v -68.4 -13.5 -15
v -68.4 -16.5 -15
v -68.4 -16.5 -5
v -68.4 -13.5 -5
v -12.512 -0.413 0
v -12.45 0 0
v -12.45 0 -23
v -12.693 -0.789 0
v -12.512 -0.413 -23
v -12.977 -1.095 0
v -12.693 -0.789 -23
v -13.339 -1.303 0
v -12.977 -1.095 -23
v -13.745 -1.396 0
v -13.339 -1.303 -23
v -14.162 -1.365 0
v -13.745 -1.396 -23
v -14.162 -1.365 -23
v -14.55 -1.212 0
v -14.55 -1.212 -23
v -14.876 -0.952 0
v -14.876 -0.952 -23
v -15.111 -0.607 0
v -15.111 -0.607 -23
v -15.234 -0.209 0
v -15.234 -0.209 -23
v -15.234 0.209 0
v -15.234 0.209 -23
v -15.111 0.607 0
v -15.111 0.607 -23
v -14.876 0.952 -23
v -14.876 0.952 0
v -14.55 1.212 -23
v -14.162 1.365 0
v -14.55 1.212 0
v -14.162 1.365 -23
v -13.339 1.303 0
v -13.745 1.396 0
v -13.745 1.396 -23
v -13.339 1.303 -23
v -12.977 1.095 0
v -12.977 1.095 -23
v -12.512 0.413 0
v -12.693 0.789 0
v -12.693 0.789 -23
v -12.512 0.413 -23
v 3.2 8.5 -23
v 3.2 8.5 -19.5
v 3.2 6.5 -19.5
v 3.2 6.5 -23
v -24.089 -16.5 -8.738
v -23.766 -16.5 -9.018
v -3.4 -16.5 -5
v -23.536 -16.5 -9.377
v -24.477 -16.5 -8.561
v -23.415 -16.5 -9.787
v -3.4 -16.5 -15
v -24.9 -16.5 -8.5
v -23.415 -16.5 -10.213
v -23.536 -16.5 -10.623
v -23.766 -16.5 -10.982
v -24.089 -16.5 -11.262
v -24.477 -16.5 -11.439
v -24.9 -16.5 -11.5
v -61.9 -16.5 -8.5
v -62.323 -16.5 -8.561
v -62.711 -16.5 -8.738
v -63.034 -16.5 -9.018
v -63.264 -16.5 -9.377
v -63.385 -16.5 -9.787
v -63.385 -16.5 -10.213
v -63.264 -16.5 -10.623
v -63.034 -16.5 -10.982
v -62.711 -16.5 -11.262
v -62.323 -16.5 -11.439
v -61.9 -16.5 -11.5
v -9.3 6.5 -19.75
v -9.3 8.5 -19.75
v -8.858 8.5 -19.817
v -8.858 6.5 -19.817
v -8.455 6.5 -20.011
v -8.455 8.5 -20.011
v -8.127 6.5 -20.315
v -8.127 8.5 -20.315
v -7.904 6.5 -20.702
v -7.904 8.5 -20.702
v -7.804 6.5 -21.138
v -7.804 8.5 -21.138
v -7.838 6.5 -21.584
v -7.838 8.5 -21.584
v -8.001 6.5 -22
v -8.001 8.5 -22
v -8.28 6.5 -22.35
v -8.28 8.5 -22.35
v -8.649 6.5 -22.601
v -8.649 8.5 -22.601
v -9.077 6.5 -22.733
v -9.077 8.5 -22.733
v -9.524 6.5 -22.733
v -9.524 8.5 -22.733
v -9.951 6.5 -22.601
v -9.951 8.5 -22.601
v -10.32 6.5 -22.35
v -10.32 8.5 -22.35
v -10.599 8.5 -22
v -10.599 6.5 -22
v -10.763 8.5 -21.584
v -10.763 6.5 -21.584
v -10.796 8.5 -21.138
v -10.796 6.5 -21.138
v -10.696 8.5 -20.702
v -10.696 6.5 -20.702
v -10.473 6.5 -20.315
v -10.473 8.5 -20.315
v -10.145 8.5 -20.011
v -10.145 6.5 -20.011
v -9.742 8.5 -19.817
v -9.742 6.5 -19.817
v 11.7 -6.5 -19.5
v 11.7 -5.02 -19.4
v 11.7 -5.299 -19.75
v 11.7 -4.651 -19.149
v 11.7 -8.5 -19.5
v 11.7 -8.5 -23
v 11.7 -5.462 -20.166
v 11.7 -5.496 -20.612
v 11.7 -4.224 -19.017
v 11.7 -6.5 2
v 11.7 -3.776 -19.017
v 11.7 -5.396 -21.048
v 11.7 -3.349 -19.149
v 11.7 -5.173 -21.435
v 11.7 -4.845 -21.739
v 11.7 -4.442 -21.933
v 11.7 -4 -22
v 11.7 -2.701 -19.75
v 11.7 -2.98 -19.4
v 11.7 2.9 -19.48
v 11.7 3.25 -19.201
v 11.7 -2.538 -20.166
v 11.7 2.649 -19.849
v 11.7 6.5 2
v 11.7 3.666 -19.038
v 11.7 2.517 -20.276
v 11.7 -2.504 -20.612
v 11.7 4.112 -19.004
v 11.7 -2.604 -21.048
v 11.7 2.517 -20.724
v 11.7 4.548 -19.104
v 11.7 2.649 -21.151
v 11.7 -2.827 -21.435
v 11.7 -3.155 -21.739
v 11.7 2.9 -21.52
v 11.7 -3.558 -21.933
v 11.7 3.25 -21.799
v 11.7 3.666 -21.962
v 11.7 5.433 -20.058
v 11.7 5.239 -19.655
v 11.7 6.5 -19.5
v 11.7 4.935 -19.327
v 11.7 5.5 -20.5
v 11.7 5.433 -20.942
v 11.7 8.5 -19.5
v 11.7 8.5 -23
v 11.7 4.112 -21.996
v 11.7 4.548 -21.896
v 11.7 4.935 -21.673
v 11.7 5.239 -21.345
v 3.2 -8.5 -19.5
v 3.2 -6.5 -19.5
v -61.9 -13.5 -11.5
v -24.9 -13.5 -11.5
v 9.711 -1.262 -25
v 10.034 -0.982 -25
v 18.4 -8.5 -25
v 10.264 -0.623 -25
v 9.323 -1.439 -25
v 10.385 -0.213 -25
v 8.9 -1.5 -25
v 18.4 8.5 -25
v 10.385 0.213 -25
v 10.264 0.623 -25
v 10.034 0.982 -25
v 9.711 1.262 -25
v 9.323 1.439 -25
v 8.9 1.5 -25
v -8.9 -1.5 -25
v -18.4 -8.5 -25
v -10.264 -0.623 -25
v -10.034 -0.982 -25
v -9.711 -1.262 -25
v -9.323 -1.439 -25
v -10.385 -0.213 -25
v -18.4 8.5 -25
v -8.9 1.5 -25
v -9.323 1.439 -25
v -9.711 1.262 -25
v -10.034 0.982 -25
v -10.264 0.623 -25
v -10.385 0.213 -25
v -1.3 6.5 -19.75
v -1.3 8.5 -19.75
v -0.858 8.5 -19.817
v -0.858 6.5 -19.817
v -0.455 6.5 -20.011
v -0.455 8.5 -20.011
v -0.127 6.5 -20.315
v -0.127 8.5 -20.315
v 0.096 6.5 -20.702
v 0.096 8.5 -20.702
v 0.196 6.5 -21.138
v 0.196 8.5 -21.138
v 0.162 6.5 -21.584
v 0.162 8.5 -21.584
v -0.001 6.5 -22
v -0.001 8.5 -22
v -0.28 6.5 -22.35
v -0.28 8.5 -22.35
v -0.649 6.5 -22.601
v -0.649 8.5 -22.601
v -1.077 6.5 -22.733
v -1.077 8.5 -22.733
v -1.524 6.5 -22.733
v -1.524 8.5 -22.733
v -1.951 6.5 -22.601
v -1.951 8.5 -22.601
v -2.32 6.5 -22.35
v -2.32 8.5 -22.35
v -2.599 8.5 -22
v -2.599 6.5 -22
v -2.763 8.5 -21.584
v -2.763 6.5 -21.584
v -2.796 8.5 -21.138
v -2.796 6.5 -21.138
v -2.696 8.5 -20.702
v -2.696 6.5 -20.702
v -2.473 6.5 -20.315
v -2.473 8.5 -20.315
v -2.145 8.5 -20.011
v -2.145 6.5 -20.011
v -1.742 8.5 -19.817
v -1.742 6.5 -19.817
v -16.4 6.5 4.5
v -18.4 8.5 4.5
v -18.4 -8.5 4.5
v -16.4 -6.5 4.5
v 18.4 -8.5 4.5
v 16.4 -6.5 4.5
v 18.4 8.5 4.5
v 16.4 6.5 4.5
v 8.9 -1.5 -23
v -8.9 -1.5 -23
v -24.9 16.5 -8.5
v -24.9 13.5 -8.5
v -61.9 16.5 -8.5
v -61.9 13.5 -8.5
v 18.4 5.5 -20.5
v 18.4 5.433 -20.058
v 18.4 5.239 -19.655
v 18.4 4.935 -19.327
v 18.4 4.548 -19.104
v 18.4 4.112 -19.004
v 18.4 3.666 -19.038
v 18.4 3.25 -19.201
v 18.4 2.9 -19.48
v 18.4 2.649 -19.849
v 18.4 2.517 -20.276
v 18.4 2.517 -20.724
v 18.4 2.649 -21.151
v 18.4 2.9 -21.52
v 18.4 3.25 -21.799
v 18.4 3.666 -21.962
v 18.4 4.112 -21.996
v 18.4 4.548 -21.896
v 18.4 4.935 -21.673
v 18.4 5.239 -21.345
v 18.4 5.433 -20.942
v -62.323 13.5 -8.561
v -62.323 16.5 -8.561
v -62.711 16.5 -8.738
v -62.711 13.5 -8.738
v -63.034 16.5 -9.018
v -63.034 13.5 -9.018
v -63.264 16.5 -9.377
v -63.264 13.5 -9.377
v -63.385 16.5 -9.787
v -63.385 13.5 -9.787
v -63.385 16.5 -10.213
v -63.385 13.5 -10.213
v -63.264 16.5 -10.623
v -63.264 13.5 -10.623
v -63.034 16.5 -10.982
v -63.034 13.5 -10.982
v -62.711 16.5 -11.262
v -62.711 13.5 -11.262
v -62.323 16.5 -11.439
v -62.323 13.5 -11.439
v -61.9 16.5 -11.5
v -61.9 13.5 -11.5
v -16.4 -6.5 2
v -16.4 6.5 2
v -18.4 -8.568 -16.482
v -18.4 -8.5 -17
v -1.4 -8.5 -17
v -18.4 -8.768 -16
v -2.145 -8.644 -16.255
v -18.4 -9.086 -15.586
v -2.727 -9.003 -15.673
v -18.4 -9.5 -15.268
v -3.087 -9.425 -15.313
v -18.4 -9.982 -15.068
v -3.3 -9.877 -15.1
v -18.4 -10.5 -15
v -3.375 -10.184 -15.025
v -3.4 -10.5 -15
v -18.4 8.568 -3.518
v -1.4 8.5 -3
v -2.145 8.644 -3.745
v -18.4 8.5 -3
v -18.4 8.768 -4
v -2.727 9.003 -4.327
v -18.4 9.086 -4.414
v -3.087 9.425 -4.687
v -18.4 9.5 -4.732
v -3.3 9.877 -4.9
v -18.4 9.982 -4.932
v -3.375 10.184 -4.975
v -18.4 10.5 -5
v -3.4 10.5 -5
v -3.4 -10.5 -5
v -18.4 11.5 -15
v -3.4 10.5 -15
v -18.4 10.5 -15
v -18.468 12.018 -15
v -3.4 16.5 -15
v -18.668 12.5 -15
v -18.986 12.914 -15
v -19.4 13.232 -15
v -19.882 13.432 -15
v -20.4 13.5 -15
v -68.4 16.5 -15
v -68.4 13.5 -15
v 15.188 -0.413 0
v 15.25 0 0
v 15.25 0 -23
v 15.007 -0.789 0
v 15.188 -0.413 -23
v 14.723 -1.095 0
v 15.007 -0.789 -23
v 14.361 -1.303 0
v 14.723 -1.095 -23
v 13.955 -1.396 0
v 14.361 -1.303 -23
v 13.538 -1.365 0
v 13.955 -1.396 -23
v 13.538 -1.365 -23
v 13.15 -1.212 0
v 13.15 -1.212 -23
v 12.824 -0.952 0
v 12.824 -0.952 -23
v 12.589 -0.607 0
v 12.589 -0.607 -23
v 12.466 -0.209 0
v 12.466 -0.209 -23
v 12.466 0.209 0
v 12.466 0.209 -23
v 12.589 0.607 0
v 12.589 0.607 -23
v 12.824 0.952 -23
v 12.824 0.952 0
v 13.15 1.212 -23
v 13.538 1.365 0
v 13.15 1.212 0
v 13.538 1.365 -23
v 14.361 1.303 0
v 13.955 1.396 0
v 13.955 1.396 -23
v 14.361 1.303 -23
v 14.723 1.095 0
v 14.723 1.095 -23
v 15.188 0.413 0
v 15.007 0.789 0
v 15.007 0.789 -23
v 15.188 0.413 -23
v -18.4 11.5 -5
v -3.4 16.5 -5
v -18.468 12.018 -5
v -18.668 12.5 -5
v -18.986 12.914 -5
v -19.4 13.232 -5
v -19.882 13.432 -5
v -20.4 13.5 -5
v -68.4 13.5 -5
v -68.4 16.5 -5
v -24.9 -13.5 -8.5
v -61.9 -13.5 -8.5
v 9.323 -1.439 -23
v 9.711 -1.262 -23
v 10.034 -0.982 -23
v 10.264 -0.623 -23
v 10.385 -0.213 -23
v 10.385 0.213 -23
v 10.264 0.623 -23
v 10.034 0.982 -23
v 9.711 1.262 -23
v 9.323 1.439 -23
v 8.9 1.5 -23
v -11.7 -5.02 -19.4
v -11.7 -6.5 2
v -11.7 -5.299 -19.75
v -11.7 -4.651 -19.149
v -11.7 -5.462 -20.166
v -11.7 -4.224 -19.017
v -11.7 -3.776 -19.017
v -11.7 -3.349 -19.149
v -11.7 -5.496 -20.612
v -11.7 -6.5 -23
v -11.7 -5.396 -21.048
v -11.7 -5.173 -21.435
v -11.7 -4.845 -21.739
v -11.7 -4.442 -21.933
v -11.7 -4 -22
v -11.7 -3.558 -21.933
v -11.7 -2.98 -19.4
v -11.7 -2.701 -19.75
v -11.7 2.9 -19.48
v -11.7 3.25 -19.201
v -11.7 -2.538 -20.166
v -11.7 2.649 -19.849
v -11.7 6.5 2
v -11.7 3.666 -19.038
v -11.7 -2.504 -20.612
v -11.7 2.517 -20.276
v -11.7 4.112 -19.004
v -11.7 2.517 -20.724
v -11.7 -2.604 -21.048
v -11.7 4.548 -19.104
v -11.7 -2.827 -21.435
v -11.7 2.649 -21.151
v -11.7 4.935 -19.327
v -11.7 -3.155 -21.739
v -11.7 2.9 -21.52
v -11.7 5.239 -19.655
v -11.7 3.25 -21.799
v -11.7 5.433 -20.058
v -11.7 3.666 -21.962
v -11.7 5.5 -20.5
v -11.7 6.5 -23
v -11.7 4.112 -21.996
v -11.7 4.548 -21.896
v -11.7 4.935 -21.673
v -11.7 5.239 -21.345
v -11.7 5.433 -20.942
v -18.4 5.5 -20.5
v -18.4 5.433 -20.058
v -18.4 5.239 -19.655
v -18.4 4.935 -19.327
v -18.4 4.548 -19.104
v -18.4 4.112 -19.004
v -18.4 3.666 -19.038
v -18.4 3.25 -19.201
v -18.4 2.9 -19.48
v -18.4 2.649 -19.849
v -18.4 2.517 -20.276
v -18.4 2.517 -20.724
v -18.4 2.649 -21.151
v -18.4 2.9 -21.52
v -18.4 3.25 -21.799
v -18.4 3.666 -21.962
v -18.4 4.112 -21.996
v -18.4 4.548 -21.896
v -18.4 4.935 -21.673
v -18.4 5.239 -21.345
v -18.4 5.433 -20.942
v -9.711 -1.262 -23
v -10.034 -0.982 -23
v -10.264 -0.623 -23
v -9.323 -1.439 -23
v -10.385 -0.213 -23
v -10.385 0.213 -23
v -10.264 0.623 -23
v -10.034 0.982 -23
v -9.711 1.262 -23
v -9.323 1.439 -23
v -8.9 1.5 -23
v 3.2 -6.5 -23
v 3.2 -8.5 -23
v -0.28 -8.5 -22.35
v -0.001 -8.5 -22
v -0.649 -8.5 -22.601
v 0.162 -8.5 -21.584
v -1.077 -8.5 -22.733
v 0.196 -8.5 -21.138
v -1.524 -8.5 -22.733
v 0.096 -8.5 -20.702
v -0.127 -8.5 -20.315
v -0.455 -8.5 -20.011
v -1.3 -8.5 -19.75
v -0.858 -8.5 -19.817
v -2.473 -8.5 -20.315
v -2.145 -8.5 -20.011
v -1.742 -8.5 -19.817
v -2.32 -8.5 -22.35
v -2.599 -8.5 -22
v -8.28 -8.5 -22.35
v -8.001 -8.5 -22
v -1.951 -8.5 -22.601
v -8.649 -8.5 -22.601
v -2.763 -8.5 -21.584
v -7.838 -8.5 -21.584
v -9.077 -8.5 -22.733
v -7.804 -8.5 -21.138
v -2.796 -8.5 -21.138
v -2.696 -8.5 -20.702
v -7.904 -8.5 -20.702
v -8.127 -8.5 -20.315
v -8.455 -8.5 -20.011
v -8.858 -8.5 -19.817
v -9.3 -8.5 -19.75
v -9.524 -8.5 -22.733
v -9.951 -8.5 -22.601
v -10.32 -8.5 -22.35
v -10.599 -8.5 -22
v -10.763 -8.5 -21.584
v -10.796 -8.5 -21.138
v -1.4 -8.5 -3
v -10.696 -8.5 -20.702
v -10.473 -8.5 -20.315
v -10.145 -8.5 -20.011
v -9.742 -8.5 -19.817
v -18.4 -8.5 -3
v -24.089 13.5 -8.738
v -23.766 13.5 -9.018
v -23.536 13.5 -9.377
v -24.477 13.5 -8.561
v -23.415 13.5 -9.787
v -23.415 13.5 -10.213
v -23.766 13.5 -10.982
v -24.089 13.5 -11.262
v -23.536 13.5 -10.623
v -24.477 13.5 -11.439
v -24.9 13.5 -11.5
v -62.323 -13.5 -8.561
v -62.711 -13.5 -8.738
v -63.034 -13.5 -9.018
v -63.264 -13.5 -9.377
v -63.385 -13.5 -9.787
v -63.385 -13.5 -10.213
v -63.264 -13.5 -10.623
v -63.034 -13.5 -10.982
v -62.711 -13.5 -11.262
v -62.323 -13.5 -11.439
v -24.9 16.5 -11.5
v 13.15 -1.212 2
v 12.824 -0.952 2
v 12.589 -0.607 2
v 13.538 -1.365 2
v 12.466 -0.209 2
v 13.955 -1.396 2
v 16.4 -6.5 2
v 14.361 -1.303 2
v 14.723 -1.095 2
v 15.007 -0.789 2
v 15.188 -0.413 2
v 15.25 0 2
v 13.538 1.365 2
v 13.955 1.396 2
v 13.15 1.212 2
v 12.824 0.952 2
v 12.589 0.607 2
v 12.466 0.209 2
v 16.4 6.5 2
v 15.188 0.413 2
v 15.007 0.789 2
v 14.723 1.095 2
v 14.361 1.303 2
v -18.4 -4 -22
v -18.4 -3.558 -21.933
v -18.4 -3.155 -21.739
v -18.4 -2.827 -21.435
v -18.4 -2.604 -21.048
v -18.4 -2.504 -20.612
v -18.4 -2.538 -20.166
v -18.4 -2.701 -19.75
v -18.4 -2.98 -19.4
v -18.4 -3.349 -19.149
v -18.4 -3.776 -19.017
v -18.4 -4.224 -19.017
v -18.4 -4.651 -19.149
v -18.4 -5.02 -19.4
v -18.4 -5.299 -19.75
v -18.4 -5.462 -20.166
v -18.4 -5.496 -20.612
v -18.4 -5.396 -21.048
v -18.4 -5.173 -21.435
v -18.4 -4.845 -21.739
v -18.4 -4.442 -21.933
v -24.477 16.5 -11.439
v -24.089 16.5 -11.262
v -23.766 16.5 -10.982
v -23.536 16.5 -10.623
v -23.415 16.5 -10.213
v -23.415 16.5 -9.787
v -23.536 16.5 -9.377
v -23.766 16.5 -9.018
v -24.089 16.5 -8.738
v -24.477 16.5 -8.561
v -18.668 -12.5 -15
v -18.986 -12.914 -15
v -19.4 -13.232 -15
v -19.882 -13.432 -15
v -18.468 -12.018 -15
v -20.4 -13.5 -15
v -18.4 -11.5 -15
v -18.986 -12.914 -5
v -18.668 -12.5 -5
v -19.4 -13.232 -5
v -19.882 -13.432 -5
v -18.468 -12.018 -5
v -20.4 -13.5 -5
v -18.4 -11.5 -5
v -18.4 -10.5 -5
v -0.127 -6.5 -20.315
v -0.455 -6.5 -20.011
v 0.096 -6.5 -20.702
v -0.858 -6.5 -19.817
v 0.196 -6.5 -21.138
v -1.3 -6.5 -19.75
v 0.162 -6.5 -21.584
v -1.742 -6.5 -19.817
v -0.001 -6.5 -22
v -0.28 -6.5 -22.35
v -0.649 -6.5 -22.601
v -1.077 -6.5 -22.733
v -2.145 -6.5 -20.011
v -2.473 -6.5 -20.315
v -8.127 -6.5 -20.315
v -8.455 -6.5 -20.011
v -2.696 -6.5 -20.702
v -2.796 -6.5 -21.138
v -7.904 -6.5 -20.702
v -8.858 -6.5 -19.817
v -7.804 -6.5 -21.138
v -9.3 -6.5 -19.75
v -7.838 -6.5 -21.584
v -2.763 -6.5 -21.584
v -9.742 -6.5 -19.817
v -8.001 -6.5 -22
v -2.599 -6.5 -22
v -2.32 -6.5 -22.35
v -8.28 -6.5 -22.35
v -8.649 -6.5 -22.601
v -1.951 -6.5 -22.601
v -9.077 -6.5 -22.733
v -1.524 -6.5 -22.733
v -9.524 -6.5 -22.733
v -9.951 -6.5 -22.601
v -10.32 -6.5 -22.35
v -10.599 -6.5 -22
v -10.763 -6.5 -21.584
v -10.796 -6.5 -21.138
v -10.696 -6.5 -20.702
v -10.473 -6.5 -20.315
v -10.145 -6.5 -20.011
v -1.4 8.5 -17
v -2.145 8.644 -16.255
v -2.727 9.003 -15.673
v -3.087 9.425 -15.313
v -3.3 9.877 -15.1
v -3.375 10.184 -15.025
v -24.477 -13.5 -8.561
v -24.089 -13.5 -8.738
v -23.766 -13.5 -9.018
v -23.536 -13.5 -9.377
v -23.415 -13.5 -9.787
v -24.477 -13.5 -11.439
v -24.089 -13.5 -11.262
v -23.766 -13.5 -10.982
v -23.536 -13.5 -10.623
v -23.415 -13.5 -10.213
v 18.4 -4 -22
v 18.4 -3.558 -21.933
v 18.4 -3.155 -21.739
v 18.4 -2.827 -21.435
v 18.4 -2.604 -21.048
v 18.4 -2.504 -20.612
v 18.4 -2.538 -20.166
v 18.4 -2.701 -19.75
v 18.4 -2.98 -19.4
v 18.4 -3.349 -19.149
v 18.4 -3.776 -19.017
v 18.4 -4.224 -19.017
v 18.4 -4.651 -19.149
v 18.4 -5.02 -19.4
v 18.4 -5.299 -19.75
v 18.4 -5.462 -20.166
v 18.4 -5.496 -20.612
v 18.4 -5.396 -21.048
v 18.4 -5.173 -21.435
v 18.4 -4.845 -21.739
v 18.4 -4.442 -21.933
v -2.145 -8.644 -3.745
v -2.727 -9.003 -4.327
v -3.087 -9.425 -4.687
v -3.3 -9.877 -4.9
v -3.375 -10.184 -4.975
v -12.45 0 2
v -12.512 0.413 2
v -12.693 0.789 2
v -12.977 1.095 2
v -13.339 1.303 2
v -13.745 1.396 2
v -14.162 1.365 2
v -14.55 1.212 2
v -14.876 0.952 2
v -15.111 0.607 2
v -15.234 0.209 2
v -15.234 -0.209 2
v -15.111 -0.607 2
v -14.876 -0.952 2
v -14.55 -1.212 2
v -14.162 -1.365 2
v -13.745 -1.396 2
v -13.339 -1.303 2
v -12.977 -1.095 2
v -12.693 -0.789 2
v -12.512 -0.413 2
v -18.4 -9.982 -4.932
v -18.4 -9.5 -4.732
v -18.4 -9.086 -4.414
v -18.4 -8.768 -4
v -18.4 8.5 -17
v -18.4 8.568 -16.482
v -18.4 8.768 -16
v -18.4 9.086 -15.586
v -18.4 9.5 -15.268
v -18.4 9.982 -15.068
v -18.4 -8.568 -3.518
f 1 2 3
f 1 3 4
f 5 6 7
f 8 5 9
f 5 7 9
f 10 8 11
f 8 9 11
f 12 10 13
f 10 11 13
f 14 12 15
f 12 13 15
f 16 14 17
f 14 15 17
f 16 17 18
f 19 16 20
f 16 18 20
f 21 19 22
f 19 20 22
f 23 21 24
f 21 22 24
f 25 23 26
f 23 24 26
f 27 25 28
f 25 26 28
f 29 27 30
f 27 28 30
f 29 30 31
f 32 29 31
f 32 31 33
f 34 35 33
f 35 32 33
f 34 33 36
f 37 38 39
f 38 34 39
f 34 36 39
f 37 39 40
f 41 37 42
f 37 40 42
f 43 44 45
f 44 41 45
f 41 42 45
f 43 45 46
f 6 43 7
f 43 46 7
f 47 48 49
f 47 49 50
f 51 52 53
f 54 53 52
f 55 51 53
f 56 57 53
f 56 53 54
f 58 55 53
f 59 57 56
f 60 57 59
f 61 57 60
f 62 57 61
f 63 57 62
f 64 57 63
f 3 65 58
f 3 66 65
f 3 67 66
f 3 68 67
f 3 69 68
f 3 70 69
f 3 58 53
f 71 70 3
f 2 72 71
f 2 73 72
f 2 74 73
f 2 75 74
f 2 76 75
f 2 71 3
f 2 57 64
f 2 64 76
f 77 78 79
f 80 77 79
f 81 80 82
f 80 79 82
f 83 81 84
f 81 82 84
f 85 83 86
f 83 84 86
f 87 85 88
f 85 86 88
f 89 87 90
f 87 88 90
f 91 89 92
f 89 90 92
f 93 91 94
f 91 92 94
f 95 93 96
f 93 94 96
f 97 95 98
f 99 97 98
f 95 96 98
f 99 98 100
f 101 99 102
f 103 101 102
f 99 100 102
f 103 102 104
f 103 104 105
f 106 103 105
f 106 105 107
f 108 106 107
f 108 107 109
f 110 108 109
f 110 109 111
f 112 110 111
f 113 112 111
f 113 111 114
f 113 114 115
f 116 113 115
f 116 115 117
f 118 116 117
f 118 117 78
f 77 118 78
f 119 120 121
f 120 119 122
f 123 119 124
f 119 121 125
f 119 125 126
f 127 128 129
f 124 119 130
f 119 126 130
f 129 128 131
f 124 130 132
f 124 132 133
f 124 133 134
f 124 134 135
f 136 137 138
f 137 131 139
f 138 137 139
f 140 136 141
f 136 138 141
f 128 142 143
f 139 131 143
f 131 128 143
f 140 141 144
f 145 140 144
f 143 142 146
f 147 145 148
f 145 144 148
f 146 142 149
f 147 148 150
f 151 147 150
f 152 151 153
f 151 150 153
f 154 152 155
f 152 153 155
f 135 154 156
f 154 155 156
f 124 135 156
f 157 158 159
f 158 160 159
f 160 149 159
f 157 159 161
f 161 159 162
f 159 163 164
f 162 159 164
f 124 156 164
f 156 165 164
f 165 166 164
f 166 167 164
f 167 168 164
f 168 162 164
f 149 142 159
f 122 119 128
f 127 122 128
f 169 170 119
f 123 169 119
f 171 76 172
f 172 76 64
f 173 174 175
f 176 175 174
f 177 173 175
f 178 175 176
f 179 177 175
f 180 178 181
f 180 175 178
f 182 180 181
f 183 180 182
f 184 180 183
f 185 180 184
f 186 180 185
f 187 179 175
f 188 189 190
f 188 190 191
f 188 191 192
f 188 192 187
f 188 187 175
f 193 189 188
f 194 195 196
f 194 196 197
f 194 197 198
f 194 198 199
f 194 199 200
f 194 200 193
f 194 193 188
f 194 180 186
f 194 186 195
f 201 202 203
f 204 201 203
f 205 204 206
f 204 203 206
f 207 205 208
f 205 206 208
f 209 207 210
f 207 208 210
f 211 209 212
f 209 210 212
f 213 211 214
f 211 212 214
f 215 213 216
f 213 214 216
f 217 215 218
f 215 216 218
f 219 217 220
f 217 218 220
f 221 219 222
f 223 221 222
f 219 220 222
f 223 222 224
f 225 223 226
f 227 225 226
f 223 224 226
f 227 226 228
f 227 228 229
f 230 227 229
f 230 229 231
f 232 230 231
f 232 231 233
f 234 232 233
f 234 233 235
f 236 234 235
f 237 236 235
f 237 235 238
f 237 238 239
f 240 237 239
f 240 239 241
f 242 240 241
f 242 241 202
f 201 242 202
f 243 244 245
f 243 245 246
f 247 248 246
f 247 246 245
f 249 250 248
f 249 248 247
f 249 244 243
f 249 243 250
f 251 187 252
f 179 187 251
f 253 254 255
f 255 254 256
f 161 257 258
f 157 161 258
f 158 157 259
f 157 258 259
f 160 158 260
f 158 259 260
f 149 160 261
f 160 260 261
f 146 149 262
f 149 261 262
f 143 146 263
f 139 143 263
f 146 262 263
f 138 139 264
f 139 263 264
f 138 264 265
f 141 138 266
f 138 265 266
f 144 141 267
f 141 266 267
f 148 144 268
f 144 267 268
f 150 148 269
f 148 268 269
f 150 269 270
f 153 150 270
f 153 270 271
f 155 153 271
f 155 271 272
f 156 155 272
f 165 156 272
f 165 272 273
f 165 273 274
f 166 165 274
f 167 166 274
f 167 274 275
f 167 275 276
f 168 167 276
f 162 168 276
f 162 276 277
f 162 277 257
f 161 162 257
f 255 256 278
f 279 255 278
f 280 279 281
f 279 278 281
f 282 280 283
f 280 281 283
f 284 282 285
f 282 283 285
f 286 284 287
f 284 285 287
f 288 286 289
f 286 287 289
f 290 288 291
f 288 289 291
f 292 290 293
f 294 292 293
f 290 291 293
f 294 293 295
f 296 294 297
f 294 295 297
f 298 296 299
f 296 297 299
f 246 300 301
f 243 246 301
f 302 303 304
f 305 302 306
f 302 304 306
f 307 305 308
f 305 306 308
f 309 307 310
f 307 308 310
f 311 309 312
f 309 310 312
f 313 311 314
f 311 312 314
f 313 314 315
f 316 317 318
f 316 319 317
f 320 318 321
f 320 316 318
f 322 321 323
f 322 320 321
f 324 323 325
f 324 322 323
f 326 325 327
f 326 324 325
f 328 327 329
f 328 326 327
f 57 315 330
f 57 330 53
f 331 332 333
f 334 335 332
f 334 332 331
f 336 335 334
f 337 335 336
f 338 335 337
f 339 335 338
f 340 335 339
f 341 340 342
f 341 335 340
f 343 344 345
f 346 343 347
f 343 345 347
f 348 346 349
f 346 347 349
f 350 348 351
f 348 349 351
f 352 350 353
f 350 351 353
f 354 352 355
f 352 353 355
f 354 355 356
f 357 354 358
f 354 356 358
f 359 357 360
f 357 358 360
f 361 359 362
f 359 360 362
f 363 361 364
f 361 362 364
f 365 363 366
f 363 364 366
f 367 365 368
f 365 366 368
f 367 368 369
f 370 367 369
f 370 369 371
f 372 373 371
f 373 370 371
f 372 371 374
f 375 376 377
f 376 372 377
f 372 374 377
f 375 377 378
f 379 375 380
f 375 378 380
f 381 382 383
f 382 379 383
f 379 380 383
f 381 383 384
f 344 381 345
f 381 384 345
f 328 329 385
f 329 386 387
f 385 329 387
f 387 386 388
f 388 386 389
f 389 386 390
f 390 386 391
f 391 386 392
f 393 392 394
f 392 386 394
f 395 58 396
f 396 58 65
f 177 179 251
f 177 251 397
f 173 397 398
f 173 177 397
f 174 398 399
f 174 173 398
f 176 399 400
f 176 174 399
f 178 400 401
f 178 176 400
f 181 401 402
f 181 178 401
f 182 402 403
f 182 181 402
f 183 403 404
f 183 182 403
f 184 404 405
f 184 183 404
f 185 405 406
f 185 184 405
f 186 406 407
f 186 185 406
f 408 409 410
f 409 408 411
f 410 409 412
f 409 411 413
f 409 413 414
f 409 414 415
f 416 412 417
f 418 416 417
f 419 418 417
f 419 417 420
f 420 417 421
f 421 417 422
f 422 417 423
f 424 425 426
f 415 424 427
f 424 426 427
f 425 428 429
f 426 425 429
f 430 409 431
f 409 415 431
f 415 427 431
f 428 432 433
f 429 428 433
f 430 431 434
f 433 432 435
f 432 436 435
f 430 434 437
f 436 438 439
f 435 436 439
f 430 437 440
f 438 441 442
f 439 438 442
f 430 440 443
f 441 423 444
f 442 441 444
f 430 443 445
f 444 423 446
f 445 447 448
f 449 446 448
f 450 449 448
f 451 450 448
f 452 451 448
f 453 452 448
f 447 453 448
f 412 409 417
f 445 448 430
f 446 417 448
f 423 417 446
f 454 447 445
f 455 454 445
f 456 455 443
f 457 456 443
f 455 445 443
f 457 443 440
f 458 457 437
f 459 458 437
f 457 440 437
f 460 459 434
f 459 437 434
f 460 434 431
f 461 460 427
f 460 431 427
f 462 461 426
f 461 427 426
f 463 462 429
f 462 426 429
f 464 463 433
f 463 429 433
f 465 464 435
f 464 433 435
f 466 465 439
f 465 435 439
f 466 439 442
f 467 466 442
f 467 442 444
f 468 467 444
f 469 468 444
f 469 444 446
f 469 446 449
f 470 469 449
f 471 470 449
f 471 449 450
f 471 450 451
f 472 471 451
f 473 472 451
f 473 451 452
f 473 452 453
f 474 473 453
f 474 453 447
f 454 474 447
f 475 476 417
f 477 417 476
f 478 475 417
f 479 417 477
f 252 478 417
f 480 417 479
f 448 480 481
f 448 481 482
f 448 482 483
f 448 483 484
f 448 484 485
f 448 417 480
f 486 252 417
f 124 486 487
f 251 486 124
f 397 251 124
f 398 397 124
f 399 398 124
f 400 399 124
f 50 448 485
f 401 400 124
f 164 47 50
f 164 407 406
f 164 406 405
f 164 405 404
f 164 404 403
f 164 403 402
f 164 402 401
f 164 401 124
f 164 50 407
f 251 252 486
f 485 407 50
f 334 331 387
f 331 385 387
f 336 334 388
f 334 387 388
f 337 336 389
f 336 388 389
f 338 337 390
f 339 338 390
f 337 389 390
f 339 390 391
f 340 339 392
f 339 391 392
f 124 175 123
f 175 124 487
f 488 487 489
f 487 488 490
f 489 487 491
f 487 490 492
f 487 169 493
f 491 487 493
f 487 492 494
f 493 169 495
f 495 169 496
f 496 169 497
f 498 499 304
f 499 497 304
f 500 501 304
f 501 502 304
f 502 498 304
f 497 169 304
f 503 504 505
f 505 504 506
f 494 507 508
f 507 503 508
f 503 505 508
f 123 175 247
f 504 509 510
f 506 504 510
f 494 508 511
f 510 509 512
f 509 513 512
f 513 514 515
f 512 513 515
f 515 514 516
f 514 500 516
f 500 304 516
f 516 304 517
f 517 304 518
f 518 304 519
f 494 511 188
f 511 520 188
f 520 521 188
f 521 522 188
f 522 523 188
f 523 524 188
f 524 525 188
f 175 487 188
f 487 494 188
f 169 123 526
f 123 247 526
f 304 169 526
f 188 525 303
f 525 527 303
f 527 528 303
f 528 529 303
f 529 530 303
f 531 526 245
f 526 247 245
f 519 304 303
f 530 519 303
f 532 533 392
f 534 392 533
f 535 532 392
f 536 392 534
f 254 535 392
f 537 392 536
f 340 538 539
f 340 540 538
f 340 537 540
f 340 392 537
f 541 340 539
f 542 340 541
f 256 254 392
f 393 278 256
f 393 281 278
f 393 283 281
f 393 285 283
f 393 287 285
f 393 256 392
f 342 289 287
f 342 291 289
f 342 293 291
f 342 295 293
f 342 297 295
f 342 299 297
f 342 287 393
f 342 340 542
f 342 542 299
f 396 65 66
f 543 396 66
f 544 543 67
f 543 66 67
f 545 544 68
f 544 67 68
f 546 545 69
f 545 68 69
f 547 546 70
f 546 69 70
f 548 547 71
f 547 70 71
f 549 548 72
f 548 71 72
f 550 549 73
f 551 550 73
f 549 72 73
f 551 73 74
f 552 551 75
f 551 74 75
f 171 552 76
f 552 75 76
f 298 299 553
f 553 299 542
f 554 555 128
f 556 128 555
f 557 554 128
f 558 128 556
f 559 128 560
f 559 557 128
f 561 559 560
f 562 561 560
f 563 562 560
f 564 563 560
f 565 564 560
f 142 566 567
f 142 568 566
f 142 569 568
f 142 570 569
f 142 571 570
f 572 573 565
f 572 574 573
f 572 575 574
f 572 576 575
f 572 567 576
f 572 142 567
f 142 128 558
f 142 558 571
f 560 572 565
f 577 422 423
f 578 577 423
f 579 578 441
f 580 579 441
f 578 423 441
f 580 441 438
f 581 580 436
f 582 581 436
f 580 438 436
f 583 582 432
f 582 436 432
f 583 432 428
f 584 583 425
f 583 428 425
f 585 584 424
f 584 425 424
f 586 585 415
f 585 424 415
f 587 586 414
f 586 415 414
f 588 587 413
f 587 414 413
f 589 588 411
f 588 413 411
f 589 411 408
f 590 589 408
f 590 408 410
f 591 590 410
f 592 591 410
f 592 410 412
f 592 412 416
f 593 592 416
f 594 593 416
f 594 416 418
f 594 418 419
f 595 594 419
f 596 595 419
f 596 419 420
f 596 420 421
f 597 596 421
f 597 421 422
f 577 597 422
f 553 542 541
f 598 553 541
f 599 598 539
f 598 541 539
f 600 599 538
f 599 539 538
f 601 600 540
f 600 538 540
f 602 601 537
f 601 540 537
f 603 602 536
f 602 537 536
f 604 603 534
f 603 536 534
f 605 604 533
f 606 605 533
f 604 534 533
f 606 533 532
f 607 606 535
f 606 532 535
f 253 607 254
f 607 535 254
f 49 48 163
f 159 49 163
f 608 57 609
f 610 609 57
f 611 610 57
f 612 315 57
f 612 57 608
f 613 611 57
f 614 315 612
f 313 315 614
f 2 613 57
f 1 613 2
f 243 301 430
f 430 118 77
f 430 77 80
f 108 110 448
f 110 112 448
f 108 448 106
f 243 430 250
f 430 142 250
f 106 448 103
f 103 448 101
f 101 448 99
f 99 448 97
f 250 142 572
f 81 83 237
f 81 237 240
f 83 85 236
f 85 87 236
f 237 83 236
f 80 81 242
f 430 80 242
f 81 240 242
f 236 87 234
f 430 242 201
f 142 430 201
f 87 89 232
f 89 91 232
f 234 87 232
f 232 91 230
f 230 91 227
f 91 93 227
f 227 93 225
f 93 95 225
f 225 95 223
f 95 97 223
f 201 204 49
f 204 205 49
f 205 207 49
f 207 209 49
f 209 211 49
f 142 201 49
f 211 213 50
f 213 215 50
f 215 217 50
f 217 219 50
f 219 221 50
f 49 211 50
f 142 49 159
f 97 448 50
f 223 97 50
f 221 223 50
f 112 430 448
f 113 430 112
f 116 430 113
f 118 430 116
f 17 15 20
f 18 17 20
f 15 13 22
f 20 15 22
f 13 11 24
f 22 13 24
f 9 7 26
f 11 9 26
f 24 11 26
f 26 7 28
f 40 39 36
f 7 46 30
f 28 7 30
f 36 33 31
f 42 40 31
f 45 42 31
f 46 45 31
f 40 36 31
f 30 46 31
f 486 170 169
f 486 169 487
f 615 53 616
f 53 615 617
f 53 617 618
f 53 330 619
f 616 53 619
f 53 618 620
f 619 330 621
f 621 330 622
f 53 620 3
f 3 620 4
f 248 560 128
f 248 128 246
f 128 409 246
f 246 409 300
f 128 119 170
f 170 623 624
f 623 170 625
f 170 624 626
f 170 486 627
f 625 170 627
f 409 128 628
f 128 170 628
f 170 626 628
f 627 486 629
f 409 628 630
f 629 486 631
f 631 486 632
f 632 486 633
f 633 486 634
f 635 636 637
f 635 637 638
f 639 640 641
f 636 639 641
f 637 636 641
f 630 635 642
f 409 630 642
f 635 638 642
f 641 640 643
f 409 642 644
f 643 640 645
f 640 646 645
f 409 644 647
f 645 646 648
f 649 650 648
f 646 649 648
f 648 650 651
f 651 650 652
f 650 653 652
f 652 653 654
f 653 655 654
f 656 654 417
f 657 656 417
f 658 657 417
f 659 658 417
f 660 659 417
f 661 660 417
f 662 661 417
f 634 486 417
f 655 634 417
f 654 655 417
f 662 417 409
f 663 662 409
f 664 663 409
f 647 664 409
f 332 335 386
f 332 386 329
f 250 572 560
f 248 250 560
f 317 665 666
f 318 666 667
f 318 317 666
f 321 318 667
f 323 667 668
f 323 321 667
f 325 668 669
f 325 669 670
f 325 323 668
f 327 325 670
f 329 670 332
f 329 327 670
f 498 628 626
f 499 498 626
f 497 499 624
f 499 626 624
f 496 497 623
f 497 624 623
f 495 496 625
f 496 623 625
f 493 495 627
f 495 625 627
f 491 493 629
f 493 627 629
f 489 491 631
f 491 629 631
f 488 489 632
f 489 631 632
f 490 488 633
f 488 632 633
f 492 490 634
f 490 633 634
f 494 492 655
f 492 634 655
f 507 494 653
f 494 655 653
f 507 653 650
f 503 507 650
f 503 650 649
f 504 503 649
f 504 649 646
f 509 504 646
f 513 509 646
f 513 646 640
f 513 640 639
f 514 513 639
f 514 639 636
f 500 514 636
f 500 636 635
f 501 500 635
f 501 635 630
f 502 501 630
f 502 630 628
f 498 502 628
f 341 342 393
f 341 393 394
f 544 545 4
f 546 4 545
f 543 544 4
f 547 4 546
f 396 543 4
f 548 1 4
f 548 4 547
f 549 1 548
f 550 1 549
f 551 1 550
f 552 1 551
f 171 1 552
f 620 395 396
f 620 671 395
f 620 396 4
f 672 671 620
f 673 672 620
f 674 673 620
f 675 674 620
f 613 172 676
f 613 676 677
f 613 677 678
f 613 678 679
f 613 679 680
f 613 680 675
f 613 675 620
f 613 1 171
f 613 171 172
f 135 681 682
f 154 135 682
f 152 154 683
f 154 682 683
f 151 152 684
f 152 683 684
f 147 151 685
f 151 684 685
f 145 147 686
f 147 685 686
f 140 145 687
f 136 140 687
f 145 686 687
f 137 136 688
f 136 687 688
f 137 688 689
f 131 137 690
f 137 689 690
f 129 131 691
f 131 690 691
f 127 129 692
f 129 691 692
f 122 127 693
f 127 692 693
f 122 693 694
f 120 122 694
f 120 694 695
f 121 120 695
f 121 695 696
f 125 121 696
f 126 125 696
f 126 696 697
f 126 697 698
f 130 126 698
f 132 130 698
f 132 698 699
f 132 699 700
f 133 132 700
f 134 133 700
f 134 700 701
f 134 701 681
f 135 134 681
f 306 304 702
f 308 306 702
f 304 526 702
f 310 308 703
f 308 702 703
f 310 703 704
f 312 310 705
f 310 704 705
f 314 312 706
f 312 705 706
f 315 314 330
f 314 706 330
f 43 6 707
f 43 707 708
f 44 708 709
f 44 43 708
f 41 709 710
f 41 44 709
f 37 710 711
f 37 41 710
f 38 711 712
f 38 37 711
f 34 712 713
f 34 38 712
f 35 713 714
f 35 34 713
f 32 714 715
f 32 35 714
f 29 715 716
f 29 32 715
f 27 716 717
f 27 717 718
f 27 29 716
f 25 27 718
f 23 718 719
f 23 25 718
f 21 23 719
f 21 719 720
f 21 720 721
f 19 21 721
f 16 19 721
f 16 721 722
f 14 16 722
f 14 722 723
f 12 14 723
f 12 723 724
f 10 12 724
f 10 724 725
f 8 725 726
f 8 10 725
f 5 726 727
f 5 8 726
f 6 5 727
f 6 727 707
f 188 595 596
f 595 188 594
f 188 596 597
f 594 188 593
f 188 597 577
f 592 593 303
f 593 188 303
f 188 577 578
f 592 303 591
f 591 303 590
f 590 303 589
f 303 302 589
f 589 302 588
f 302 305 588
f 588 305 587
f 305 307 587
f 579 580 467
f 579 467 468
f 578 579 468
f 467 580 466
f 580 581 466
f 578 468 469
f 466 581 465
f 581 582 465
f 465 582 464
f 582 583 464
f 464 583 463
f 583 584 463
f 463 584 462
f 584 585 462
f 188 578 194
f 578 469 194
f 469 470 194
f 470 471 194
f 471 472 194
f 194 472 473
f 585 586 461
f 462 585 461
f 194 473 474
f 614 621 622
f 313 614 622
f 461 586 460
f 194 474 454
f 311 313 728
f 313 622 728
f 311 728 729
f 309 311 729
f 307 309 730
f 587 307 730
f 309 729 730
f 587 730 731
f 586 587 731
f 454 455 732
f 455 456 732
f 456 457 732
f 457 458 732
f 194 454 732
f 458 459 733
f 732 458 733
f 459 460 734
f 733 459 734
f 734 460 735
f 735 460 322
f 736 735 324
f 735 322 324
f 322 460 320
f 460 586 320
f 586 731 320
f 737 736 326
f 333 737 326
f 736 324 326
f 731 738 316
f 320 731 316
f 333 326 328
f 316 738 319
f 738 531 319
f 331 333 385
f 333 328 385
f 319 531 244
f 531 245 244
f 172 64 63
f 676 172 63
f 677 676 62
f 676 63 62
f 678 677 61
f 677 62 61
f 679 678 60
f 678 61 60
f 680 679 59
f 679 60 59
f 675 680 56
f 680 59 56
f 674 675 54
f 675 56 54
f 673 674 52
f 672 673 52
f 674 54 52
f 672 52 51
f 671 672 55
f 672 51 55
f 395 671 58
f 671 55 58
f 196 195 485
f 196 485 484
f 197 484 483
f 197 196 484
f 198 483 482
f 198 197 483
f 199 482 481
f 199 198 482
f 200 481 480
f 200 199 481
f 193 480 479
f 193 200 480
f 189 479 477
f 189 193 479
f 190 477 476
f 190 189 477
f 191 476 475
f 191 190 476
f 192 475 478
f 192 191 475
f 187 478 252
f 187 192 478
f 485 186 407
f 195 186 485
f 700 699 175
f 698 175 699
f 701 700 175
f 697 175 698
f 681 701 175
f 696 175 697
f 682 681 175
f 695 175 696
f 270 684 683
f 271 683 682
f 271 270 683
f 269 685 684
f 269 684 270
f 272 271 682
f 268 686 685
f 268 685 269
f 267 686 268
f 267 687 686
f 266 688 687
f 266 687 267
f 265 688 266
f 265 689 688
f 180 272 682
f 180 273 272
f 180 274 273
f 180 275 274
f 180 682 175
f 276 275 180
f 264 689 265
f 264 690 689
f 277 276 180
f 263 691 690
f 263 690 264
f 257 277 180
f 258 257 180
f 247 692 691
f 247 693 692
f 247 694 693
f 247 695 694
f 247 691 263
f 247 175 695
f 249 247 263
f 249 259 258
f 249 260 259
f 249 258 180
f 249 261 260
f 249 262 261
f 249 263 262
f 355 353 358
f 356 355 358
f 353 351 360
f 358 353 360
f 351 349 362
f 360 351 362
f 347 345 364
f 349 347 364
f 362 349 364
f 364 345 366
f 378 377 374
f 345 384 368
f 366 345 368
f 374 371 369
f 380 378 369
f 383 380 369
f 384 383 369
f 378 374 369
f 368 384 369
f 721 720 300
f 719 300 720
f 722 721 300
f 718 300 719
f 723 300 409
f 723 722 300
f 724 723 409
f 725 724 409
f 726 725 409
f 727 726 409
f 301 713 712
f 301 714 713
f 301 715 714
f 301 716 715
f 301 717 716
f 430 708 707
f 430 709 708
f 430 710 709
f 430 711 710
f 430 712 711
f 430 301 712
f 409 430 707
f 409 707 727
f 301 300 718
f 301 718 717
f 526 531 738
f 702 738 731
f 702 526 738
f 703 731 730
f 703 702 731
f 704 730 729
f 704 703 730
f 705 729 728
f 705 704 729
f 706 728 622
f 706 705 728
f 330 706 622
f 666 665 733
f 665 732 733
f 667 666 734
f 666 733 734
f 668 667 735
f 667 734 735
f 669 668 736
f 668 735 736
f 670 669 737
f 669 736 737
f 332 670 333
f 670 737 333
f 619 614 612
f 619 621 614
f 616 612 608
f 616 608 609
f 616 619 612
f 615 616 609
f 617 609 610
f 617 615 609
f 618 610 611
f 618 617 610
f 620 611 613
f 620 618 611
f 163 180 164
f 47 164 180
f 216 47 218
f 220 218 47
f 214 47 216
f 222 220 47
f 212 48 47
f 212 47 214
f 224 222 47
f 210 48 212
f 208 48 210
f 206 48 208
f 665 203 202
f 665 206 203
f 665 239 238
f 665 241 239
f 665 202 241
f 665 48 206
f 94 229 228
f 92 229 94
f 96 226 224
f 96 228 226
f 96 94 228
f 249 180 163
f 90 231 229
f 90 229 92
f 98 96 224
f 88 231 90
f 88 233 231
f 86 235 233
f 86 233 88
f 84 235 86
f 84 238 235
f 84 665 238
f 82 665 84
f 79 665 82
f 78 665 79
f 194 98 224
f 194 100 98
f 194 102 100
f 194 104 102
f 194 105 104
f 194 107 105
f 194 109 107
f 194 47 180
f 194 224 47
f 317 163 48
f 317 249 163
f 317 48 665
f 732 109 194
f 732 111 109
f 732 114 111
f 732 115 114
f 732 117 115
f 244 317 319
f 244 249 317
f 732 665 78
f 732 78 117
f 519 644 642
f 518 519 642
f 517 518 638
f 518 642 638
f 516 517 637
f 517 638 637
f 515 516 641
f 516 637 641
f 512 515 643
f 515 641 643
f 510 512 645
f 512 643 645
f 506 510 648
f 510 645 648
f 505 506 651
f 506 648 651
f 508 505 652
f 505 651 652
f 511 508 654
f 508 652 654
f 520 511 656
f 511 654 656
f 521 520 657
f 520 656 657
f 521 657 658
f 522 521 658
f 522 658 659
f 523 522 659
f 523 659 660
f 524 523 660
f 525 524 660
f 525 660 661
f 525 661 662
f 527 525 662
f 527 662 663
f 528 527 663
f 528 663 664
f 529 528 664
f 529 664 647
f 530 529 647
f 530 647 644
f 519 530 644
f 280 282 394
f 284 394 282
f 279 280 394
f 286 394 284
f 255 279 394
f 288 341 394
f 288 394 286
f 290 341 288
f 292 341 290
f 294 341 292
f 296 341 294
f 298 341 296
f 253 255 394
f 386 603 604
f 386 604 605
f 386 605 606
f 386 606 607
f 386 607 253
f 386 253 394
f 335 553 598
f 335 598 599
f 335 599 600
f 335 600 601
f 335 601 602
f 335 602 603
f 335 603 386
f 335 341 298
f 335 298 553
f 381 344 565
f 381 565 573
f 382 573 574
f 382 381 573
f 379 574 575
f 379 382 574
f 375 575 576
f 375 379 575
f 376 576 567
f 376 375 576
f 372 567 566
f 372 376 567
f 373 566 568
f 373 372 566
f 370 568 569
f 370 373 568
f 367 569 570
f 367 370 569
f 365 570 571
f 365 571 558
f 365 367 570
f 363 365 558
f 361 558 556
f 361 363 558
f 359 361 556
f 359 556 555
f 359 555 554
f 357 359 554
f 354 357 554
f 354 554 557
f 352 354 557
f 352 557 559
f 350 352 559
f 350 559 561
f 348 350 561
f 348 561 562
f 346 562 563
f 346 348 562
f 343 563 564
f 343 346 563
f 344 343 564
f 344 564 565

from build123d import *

# Parameters (mm, degrees)
SKETCH1_R                = 1.4
BOSS_EXTRUDE1_DEPTH      = 2
BOSS_EXTRUDE1_2_DEPTH    = 2
BOSS_EXTRUDE3_DEPTH      = 2.5
BOSS_EXTRUDE3_DEPTH_BACK = 25
SKETCH4_W                = 36.8
SKETCH4_H                = 17
BOSS_EXTRUDE4_START      = 23
SKETCH5_W                = 4.7
SKETCH5_H                = 13
SKETCH5_R                = 1.4
BOSS_EXTRUDE4_DEPTH      = 23
SKETCH6_W                = 36.8
SKETCH6_H                = 17
BOSS_EXTRUDE5_DEPTH      = 2
SKETCH7_R                = 1.5
SKETCH7_W                = 8.5
SKETCH7_H                = 3.5
CUT_EXTRUDE1_DEPTH       = 36.391524409
SKETCH8_R                = 1.5
CUT_EXTRUDE2_DEPTH       = 46.293376999
CUT_EXTRUDE3_DEPTH       = 36.791898525
BOSS_EXTRUDE6_DEPTH      = 10
CUT_EXTRUDE4_DEPTH       = 79.762681519
CUT_EXTRUDE4_DEPTH_BACK  = 79.762681519
FILLET1_R                = 2


with BuildPart() as part:
    # Sketch1 → Boss-Extrude1 (new body)
    with BuildSketch(Plane.XY):
        Polygon((-11.7, -6.5), (-11.7, 0), (-11.7, 6.5), (-16.4, 6.5), (-16.4, -6.5), align=None)
        with Locations((-13.85, 0)):
            Circle(SKETCH1_R, mode=Mode.SUBTRACT)
    extrude(amount=BOSS_EXTRUDE1_DEPTH)



with BuildPart() as body_2:
    # Sketch1 → Boss-Extrude1 2 (new body)
    with BuildSketch(Plane.XY):
        Polygon((11.7, 6.5), (11.7, 0), (11.7, -6.5), (16.4, -6.5), (16.4, 6.5), align=None)
        with Locations((13.85, 0)):
            Circle(SKETCH1_R, mode=Mode.SUBTRACT)
    extrude(amount=BOSS_EXTRUDE1_2_DEPTH)


with BuildPart() as part_1:
    add(part.part)

    add(body_2.part)  # Boss-Extrude3 merges body 2
    # Sketch4 → Boss-Extrude3 (add, two sides: drawn at the far end of the back side and taken through both)
    with BuildSketch(Plane.XY.offset(2).offset(-BOSS_EXTRUDE3_DEPTH_BACK)):
        Rectangle(SKETCH4_W, SKETCH4_H)
        Polygon((-16.4, 6.5), (-11.7, 6.5), (11.7, 6.5), (16.4, 6.5), (16.4, -6.5), (11.7, -6.5), (-11.7, -6.5), (-16.4, -6.5), align=None, mode=Mode.SUBTRACT)
    extrude(amount=BOSS_EXTRUDE3_DEPTH + BOSS_EXTRUDE3_DEPTH_BACK)

    # Sketch5 → Boss-Extrude4 (add)
    # profile 1 of 2: a face of its own
    with BuildSketch(Plane(origin=(0, 0, 0), x_dir=(-1, 0, 0), z_dir=(0, 0, -1)).offset(BOSS_EXTRUDE4_START)):
        with Locations((-14.05, 0)):
            Rectangle(SKETCH5_W, SKETCH5_H)
        with Locations(Location((-13.85, 0, 0), (0, 0, 180))):
            Circle(SKETCH5_R, mode=Mode.SUBTRACT)
    # profile 2 of 2: a face of its own
    with BuildSketch(Plane(origin=(0, 0, 0), x_dir=(-1, 0, 0), z_dir=(0, 0, -1)).offset(BOSS_EXTRUDE4_START)):
        with Locations((14.05, 0)):
            Rectangle(SKETCH5_W, SKETCH5_H)
        with Locations(Location((13.85, 0, 0), (0, 0, 180))):
            Circle(SKETCH5_R, mode=Mode.SUBTRACT)
    extrude(amount=-BOSS_EXTRUDE4_DEPTH)

    # Sketch6 → Boss-Extrude5 (add)
    with BuildSketch(Plane(origin=(0, 0, -23), x_dir=(-1, 0, 0), z_dir=(0, 0, -1))):
        Rectangle(SKETCH6_W, SKETCH6_H)
    extrude(amount=BOSS_EXTRUDE5_DEPTH)

    # Sketch7 → Cut-Extrude1 (cut, through all)
    with BuildSketch(Plane(origin=(0, 8.5, 0), x_dir=(1, 0, 0), z_dir=(0, 1, 0))):
        with Locations(Location((-1.300147184, 21.25, 0), (0, 0, 270))):
            Circle(SKETCH7_R)
        with Locations(Location((-9.300147184, 21.25, 0), (0, 0, 270))):
            Circle(SKETCH7_R)
        with Locations((7.45, 21.25)):
            Rectangle(SKETCH7_W, SKETCH7_H)
    extrude(amount=-CUT_EXTRUDE1_DEPTH, mode=Mode.SUBTRACT)

    # Sketch8 → Cut-Extrude2 (cut, through all)
    with BuildSketch(Plane(origin=(18.4, 0, 0), x_dir=(0, 0, -1), z_dir=(1, 0, 0))):
        with Locations(Location((20.5, 4, 0), (0, 0, 90))):
            Circle(SKETCH8_R)
        with Locations((20.5, -4)):
            Circle(SKETCH8_R)
    extrude(amount=-CUT_EXTRUDE2_DEPTH, mode=Mode.SUBTRACT)

    # Sketch9 → Cut-Extrude3 (cut, through all)
    with BuildSketch(Plane(origin=(0, 0, -25), x_dir=(-1, 0, 0), z_dir=(0, 0, -1))):
        with BuildLine():
            Line((8.9, -1.5), (-8.9, -1.5))
            ThreePointArc((-8.9, -1.5), (-10.4, 0), (-8.9, 1.5))
            Line((-8.9, 1.5), (8.9, 1.5))
            ThreePointArc((8.9, 1.5), (10.4, 0), (8.9, -1.5))
        make_face()
    extrude(amount=-CUT_EXTRUDE3_DEPTH, mode=Mode.SUBTRACT)

    # Sketch10 → Boss-Extrude6 (add)
    with BuildSketch(Plane(origin=(0, 0, -15), x_dir=(-1, 0, 0), z_dir=(0, 0, -1))):
        Polygon((68.4, -13.5), (18.4, -13.5), (18.4, -8.5), (3.4, -8.5), (3.4, -16.5), (68.4, -16.5), align=None)
        Polygon((3.4, 8.5), (18.4, 8.5), (18.4, 13.5), (68.4, 13.5), (68.4, 16.5), (3.4, 16.5), align=None)
    extrude(amount=-BOSS_EXTRUDE6_DEPTH)

    # Sketch12 → Cut-Extrude4 (cut, two sides: drawn at the far end of the back side and taken through both)
    with BuildSketch(Plane(origin=(0, -13.5, 0), x_dir=(1, 0, 0), z_dir=(0, 1, 0)).offset(-CUT_EXTRUDE4_DEPTH_BACK)):
        with BuildLine():
            Line((-24.9, 8.5), (-61.9, 8.5))
            ThreePointArc((-61.9, 8.5), (-63.4, 10), (-61.9, 11.5))
            Line((-61.9, 11.5), (-24.9, 11.5))
            ThreePointArc((-24.9, 11.5), (-23.4, 10), (-24.9, 8.5))
        make_face()
    extrude(amount=CUT_EXTRUDE4_DEPTH + CUT_EXTRUDE4_DEPTH_BACK, mode=Mode.SUBTRACT)

    # Fillet1
    fillet1_edges = [part_1.edges().sort_by_distance(p)[0] for p in [
        (-3.4, 8.5, -10),
        (-18.4, 13.5, -10),
        (-10.9, 8.5, -5),
        (-10.9, 8.5, -15),
        (-10.9, -8.5, -15),
        (-3.4, -8.5, -10),
        (-10.9, -8.5, -5),
        (-18.4, -13.5, -10),
    ]]
    fillet(fillet1_edges, radius=FILLET1_R)


solid = part_1.part
